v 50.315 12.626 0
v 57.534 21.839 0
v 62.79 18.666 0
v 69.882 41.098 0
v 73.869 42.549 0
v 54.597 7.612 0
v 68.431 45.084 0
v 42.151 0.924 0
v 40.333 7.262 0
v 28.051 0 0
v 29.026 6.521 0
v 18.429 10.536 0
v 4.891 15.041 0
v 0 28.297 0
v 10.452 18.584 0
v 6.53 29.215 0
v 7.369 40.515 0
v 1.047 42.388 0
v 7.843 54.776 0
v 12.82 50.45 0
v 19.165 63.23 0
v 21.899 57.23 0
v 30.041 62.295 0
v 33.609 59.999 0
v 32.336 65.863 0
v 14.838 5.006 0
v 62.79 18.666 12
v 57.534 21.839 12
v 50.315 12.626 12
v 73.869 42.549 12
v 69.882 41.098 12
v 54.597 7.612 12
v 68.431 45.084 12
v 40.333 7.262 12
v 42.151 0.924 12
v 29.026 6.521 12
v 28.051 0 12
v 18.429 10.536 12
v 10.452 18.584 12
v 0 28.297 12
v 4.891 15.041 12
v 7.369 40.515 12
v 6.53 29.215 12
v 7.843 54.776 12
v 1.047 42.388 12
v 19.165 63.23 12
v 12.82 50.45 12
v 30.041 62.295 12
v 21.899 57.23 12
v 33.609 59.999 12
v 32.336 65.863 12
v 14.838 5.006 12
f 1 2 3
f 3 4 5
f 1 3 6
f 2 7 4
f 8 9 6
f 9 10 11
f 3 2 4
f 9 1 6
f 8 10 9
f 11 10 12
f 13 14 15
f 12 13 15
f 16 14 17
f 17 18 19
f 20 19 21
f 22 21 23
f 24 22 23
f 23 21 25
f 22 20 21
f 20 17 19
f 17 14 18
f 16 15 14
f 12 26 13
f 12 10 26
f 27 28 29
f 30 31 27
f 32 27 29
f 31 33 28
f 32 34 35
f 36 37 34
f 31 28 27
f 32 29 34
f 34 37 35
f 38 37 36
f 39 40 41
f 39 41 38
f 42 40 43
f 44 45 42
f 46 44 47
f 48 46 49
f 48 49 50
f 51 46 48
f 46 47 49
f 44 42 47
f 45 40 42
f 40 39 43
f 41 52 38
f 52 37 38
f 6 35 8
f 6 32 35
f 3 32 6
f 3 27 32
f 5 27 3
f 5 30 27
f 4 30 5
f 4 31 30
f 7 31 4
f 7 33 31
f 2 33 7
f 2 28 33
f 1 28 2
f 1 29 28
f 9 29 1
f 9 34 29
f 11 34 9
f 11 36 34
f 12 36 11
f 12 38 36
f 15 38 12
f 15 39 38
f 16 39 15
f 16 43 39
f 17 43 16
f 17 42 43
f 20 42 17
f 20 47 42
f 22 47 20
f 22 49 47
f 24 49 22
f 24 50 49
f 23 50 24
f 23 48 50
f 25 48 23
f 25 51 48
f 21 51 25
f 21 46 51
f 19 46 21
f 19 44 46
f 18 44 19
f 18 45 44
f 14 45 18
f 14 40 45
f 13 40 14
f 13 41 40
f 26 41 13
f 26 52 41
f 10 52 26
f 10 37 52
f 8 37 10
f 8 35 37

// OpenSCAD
$fn = 32;

// ----------------------------------------------------------------------
// Hook plate: curl radius 30 mm over 245 degrees, 6 mm thick band
// ----------------------------------------------------------------------

// --- parameters (mm) ---
profile_height = 12;      // extrusion height
profile_points = 26;      // points of the closed outline

profile = [[30.041, 62.295], [32.336, 65.863], [19.165, 63.23], [7.843, 54.776], [1.047, 42.388], [0, 28.297], [4.891, 15.041], [14.838, 5.006], [28.051, 0], [42.151, 0.924], [54.597, 7.612], [62.79, 18.666], [73.869, 42.549], [69.882, 41.098], [68.431, 45.084], [57.534, 21.839], [50.315, 12.626], [40.333, 7.262], [29.026, 6.521], [18.429, 10.536], [10.452, 18.584], [6.53, 29.215], [7.369, 40.515], [12.82, 50.45], [21.899, 57.23], [33.609, 59.999]];  // single closed polygon, 26 points, counter clockwise

// --- the one profile operation ---
linear_extrude(height = profile_height) polygon(points = profile);
